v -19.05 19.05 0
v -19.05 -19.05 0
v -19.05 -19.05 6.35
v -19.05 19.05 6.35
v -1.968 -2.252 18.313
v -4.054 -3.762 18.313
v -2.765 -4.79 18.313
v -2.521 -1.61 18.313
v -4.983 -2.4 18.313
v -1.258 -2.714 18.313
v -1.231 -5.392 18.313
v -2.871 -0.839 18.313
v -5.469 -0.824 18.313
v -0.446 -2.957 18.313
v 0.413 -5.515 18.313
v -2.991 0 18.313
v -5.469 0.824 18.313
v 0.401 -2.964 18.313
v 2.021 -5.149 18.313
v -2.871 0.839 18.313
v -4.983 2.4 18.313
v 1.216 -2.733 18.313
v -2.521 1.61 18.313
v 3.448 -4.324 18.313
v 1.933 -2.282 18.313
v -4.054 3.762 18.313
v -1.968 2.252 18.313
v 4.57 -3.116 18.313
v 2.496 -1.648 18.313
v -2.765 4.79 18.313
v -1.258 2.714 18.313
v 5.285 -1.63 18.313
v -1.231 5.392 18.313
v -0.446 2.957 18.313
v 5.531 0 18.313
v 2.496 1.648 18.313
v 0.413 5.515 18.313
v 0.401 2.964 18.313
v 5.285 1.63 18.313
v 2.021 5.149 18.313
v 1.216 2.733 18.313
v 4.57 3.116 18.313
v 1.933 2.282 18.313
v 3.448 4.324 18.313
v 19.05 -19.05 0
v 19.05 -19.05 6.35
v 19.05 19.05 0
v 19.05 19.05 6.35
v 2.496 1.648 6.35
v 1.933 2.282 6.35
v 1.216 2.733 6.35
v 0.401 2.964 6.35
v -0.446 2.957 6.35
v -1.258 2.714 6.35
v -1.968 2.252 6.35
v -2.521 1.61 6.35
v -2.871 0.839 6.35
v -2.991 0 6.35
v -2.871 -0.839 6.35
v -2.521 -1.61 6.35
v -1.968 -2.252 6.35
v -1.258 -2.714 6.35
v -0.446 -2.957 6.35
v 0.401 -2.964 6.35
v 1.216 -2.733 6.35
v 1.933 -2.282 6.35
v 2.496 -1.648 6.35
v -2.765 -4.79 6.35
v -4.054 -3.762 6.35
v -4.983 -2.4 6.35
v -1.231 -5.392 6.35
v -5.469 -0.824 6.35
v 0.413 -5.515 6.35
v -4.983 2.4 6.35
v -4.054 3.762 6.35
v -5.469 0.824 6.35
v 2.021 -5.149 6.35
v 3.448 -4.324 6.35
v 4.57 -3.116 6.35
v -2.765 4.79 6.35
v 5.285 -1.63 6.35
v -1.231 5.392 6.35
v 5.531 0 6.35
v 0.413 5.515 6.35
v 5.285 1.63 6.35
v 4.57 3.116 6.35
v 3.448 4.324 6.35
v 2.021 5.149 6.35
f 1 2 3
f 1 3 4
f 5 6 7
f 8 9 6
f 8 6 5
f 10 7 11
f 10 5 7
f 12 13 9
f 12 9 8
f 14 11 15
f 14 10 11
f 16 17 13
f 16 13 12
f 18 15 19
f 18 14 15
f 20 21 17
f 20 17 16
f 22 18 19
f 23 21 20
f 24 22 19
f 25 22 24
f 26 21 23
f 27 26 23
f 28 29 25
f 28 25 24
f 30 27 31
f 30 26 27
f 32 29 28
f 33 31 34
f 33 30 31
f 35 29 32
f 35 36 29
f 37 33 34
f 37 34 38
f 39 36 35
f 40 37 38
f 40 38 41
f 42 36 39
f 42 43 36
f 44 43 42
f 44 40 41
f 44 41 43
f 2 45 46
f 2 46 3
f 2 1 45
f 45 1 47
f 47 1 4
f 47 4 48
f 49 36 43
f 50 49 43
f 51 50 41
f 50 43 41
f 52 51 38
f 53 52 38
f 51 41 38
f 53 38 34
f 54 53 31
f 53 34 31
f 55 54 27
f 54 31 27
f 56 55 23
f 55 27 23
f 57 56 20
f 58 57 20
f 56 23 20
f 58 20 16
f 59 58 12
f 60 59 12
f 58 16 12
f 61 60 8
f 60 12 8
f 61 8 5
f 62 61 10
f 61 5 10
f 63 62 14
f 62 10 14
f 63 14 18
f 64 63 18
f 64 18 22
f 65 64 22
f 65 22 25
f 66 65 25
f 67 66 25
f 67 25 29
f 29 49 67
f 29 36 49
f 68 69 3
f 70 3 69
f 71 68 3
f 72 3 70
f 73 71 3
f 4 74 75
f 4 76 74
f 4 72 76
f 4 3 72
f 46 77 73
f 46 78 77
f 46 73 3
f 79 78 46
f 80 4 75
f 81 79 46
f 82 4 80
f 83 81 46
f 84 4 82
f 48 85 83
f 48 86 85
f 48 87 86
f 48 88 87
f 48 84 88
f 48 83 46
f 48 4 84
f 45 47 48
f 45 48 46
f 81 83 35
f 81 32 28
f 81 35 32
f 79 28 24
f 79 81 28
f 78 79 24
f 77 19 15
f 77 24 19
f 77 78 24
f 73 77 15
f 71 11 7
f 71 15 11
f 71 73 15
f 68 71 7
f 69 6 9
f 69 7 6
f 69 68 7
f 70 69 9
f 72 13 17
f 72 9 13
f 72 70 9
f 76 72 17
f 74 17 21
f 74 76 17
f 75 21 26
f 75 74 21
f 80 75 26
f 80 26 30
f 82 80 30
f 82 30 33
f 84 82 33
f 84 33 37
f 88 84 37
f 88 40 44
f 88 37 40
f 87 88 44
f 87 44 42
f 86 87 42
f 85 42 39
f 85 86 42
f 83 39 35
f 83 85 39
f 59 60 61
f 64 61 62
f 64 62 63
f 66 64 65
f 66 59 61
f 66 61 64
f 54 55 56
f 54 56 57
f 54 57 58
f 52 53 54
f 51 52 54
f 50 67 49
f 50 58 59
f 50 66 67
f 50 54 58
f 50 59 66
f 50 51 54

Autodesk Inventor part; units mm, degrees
ref_plane "YZ Plane" through (0, 0, 0) normal (1, 0, 0) x (0, 1, 0)
ref_plane "XZ Plane" through (0, 0, 0) normal (0, 1, 0) x (-1, 0, 0)
ref_plane "XY Plane" through (0, 0, 0) normal (0, 0, 1) x (1, 0, 0)
sketch "Sketch1" plane through (0, 0, 0) normal (0, 0, 1) x (1, 0, 0)
  line L0 (19.05, -19.05) -> (-19.05, -19.05)
  line L1 (-19.05, -19.05) -> (-19.05, 19.05)
  line L2 (-19.05, 19.05) -> (19.05, 19.05)
  line L3 (19.05, 19.05) -> (19.05, -19.05)
  line L4 (19.05, -19.05) -> (-19.05, 19.05) construction
  line L5 (-19.05, -19.05) -> (19.05, 19.05) construction
  point P0 (0, 0)
  dimension "d0" = 38.1
  dimension "d1" = 38.1
extrude "Extrusion1" add sketch "Sketch1" along normal blind 6.35
sketch "Sketch2" plane through (0, 0, 6.35) normal (0, 0, 1) x (1, 0, 0)
  circle A0 centre (0, 0) radius 5.5309
  dimension "d4" = 11.0617
extrude "Extrusion2" add sketch "Sketch2" along normal blind 11.9634
sketch "Sketch3" plane through (0, 0, 18.3134) normal (0, 0, 1) x (1, 0, 0)
  circle A0 centre (0, 0) radius 2.9909
  line L0 (2.4956, 1.6485) -> (2.4956, -1.6485)
  dimension "d7" = 5.9817
  dimension "d8" = 5.4864
extrude "Extrusion3" cut sketch "Sketch3" against normal blind 11.9634 contours L0 A0 picked at (0.3599, 0.1211)
properties part number "Hub"
